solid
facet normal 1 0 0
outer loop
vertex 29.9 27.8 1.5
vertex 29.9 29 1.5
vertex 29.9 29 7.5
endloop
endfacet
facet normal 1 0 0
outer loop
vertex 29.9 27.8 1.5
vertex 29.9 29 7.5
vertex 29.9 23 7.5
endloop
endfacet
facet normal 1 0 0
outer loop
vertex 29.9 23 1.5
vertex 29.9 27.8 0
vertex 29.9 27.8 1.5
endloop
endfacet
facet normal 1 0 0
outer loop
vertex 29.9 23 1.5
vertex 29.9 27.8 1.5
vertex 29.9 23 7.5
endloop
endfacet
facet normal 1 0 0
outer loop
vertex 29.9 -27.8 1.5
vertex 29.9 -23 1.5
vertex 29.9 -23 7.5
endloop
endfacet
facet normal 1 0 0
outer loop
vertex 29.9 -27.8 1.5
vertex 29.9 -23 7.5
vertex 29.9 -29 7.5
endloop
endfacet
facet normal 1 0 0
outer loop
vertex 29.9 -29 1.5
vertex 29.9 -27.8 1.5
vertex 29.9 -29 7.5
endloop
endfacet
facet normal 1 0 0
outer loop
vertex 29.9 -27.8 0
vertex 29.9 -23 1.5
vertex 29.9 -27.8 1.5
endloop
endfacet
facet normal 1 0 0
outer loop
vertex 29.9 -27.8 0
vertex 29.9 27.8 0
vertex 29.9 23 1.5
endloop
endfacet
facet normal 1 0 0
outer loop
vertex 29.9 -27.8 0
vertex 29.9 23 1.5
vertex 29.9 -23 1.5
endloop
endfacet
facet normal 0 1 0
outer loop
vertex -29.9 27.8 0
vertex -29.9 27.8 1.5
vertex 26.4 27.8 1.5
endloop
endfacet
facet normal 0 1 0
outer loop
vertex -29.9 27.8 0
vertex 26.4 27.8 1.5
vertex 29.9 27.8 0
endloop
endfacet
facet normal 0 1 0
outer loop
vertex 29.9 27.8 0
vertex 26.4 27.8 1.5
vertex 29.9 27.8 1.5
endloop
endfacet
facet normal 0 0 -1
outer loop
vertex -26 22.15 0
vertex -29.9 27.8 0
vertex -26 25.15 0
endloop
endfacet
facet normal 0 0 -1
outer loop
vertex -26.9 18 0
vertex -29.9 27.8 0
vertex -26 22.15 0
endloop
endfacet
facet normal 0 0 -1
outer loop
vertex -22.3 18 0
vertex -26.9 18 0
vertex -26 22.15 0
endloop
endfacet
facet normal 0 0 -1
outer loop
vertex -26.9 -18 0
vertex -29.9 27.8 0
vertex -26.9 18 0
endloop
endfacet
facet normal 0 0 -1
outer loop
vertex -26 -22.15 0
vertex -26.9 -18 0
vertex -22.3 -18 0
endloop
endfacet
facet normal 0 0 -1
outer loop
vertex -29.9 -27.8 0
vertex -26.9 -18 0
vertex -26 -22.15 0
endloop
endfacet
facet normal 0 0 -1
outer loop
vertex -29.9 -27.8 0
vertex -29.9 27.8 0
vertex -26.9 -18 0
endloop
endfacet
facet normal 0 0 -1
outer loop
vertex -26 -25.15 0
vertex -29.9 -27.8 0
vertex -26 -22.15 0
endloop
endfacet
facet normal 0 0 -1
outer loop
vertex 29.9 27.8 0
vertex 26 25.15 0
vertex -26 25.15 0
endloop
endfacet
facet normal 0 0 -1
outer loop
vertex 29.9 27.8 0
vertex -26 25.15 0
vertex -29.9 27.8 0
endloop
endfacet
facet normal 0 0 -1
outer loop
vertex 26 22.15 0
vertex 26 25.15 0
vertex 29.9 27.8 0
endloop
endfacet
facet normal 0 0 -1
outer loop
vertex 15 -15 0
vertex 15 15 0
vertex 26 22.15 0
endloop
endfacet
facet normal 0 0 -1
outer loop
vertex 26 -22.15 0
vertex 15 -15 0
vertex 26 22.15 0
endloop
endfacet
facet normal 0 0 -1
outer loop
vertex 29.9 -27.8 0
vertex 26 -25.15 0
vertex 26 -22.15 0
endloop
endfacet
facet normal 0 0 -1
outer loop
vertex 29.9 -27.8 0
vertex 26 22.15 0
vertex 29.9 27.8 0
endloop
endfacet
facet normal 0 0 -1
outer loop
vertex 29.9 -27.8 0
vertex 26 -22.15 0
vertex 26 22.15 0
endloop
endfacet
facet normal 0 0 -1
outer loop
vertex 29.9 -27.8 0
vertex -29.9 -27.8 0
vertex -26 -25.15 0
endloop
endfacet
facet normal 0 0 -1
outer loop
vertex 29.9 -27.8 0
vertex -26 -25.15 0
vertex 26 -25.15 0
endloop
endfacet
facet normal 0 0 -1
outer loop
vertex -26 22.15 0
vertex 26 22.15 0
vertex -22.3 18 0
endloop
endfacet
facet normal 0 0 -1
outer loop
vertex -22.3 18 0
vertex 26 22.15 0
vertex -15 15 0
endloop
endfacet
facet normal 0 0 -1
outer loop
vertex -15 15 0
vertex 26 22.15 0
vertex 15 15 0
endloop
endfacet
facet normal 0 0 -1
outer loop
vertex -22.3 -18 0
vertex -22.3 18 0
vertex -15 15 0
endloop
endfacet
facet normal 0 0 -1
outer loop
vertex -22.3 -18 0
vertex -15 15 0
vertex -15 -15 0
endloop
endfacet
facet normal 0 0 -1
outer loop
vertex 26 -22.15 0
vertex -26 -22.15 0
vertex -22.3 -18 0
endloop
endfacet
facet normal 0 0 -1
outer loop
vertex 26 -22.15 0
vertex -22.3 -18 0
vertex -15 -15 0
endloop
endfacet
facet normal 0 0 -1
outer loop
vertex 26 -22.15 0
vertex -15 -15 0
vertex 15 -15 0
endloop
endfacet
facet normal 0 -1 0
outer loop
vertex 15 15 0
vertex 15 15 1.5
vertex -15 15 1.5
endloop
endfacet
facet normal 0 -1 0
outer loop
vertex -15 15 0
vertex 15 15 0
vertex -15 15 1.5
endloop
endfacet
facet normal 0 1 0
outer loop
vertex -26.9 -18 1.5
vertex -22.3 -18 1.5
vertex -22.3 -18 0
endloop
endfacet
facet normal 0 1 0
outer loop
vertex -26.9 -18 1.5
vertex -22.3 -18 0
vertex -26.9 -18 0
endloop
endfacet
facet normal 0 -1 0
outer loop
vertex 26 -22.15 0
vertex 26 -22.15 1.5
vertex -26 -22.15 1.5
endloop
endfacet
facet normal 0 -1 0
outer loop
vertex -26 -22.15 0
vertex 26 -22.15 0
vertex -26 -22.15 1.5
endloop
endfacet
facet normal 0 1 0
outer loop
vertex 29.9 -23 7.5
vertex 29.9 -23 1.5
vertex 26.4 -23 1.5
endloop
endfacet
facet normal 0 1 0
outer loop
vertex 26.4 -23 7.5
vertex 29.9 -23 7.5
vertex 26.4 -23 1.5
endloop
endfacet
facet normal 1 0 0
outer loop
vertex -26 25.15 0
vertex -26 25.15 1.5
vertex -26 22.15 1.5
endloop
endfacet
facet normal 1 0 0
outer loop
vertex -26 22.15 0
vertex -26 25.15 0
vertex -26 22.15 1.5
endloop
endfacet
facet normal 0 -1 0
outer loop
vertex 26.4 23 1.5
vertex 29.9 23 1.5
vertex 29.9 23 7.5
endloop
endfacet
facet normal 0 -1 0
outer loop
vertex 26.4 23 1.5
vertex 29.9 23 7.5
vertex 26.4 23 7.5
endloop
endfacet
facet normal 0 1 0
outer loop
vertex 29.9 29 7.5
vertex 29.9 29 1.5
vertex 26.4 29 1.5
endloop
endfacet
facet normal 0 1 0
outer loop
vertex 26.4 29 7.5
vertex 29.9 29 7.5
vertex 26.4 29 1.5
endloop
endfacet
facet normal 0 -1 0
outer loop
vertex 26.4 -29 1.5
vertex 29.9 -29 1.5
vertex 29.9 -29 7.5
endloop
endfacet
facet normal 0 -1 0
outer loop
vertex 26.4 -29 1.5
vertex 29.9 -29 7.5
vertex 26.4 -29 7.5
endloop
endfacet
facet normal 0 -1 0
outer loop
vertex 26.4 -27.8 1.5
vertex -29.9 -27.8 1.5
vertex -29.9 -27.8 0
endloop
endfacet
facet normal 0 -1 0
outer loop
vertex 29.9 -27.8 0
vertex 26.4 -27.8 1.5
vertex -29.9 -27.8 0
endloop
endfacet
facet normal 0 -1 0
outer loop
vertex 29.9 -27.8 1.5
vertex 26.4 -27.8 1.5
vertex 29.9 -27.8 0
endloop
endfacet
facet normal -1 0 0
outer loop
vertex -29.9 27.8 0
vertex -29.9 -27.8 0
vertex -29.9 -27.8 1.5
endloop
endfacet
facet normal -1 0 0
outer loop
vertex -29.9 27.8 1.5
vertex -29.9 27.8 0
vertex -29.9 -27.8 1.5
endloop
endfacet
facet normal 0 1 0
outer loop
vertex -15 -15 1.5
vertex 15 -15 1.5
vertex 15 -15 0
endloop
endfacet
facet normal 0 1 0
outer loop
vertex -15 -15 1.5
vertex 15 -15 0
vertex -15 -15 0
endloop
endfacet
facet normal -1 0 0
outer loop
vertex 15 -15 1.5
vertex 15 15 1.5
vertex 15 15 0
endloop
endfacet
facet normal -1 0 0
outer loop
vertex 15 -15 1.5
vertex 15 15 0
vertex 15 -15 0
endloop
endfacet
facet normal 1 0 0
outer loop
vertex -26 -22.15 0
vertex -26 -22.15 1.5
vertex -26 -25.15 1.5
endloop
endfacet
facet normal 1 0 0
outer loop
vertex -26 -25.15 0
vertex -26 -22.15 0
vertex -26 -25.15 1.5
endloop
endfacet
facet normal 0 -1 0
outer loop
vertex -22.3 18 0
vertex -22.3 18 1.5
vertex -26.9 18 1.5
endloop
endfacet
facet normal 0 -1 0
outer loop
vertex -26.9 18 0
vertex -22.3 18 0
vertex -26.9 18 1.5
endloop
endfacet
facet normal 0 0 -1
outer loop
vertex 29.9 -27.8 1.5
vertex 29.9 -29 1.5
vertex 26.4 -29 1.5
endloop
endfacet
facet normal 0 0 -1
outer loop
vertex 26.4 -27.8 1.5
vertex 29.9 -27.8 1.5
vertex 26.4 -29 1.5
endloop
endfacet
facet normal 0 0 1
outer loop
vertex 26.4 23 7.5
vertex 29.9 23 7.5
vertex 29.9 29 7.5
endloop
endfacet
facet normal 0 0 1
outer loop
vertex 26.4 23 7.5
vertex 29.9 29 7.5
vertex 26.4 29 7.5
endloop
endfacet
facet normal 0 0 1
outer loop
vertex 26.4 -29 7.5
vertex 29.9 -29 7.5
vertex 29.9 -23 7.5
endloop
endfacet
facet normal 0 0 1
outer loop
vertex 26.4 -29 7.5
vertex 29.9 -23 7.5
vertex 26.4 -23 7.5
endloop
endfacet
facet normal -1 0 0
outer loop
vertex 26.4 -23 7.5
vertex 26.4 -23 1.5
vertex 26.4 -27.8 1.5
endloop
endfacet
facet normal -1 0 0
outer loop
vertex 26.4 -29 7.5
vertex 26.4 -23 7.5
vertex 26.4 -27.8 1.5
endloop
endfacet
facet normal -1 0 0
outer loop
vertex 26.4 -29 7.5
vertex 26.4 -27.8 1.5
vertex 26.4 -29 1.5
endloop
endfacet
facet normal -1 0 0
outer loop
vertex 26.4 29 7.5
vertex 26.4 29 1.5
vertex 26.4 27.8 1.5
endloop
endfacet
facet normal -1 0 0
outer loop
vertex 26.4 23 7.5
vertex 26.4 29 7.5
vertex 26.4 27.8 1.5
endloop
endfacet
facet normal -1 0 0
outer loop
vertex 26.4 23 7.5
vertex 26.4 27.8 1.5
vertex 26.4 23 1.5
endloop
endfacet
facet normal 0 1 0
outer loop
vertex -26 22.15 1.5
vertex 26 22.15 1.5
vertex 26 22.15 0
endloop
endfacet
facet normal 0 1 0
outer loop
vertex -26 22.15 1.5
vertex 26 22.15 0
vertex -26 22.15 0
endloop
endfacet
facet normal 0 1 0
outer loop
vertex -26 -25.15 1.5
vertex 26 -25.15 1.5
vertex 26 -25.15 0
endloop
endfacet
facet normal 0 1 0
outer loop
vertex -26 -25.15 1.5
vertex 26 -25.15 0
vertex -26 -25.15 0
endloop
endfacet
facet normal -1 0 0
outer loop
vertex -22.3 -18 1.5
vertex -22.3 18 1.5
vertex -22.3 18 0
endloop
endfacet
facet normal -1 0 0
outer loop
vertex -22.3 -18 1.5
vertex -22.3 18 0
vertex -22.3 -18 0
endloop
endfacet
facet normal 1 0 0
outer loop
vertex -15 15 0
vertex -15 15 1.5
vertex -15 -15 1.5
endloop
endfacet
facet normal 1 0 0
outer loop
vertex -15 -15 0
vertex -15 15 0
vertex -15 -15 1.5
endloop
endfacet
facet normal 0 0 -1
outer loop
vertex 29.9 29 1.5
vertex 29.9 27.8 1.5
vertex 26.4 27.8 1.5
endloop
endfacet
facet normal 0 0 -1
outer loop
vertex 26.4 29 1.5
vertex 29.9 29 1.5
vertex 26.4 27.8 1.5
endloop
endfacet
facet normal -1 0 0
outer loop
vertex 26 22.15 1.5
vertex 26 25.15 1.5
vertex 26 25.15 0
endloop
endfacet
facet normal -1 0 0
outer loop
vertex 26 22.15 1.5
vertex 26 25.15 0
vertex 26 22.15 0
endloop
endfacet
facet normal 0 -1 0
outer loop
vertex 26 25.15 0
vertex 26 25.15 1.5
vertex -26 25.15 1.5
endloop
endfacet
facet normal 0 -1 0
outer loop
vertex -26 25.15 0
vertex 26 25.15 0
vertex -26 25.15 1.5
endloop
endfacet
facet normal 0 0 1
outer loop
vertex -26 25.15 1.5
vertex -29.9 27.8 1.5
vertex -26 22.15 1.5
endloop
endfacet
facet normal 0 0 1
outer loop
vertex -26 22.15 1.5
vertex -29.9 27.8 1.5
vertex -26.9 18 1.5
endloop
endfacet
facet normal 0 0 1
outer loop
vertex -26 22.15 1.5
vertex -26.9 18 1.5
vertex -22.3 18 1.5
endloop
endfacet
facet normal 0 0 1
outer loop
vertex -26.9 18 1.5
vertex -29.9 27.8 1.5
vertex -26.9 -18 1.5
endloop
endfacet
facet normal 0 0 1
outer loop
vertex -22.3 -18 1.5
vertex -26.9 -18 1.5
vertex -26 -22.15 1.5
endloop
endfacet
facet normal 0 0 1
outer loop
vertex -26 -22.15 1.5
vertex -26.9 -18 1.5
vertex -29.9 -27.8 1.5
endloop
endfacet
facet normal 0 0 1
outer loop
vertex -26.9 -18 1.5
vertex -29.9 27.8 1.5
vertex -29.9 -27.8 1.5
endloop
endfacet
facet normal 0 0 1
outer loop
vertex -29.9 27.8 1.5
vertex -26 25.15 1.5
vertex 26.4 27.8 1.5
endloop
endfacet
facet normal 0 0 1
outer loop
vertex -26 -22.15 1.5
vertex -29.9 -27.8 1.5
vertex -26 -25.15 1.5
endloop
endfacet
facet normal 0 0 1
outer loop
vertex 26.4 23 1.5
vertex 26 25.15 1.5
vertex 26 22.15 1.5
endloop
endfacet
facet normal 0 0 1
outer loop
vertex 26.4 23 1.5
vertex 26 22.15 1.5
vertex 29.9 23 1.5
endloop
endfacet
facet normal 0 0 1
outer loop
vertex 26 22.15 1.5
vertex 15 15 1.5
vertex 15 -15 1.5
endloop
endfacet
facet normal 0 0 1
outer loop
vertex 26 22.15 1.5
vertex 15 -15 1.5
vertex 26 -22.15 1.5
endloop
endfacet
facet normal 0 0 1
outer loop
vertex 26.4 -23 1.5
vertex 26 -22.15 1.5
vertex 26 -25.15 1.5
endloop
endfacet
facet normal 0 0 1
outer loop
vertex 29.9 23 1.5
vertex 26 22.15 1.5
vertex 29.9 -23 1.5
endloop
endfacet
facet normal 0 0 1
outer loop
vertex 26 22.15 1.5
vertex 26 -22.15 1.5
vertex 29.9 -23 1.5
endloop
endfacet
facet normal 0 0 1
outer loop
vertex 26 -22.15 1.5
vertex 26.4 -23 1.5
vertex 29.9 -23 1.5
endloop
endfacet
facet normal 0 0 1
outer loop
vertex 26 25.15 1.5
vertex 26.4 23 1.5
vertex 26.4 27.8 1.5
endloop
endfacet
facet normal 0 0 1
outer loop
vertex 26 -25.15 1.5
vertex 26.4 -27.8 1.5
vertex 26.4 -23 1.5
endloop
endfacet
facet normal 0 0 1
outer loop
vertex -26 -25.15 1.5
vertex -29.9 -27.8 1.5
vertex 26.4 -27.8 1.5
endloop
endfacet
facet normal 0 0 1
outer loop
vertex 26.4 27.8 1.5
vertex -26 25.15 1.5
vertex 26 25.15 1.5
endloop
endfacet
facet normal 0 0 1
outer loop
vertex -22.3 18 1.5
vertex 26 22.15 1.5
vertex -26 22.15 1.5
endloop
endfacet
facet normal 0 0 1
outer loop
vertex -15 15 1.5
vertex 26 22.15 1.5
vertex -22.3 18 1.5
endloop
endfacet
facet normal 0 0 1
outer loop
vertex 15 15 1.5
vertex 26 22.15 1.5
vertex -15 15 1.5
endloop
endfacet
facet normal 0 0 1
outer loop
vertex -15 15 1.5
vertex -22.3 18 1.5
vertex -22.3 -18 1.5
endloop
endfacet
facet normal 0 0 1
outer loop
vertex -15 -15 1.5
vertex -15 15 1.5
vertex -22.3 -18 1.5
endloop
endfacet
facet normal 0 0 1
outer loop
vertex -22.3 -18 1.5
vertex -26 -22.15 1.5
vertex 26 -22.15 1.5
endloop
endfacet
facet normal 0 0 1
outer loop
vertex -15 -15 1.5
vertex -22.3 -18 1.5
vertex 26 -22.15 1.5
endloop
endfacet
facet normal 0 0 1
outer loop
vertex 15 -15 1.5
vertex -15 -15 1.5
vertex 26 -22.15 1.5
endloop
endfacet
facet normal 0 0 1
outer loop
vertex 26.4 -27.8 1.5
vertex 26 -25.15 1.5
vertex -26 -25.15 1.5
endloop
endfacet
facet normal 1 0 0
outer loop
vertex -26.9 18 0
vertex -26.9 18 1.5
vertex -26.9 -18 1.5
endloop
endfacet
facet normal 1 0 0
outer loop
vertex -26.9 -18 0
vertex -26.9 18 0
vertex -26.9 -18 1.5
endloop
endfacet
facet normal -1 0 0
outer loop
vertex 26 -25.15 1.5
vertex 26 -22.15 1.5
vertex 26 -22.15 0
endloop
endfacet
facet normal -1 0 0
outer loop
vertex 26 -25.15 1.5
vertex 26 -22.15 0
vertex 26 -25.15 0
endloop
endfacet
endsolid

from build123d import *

# Parameters (mm, degrees)
SKETCH_W        = 59.8
SKETCH_H        = 1.5
PAD_DEPTH       = 27.8
SKETCH002_W     = 52
SKETCH002_H     = 3
SKETCH002_W_2   = 30
SKETCH002_H_2   = 30
SKETCH002_W_3   = 4.6
SKETCH002_H_3   = 36
POCKET_DEPTH    = 5
SKETCH003_W     = 3.5
SKETCH003_H     = 6
PAD001_DEPTH    = 6
SKETCH004_R     = 1.75
POCKET001_DEPTH = 5


with BuildPart() as part:
    # Sketch → Pad (new body, symmetric)
    with BuildSketch(Plane.XZ):
        with Locations((0, 0.75)):
            Rectangle(SKETCH_W, SKETCH_H)
    extrude(amount=PAD_DEPTH, both=True)

    # Sketch002 → Pocket (cut)
    with BuildSketch(Plane(origin=(0, 0, 1.5), x_dir=(-1, 0, 0), z_dir=(0, 0, 1))):
        with Locations((0, 23.65)):
            Rectangle(SKETCH002_W, SKETCH002_H)
        with Locations((0, -23.65)):
            Rectangle(SKETCH002_W, SKETCH002_H)
        Rectangle(SKETCH002_W_2, SKETCH002_H_2)
        with Locations((24.6, 0)):
            Rectangle(SKETCH002_W_3, SKETCH002_H_3)
    extrude(amount=-POCKET_DEPTH, mode=Mode.SUBTRACT)

    # Sketch003 → Pad001 (new body)
    with BuildSketch(Plane(origin=(0, 0, 1.5), x_dir=(-1, 0, 0), z_dir=(0, 0, 1))):
        with Locations((-28.15, 26)):
            Rectangle(SKETCH003_W, SKETCH003_H)
        with Locations((-28.15, -26)):
            Rectangle(SKETCH003_W, SKETCH003_H)
    extrude(amount=PAD001_DEPTH)

    # Sketch004 → Pocket001 (cut)
    with BuildSketch(Plane(origin=(-26, 0, 0), x_dir=(0, 0, 1), z_dir=(1, 0, 0))):
        with Locations((-4.5, -25.5)):
            Circle(SKETCH004_R)
        with Locations((-4.5, 25.5)):
            Circle(SKETCH004_R)
    extrude(amount=-POCKET001_DEPTH, mode=Mode.SUBTRACT)


solid = part.part
